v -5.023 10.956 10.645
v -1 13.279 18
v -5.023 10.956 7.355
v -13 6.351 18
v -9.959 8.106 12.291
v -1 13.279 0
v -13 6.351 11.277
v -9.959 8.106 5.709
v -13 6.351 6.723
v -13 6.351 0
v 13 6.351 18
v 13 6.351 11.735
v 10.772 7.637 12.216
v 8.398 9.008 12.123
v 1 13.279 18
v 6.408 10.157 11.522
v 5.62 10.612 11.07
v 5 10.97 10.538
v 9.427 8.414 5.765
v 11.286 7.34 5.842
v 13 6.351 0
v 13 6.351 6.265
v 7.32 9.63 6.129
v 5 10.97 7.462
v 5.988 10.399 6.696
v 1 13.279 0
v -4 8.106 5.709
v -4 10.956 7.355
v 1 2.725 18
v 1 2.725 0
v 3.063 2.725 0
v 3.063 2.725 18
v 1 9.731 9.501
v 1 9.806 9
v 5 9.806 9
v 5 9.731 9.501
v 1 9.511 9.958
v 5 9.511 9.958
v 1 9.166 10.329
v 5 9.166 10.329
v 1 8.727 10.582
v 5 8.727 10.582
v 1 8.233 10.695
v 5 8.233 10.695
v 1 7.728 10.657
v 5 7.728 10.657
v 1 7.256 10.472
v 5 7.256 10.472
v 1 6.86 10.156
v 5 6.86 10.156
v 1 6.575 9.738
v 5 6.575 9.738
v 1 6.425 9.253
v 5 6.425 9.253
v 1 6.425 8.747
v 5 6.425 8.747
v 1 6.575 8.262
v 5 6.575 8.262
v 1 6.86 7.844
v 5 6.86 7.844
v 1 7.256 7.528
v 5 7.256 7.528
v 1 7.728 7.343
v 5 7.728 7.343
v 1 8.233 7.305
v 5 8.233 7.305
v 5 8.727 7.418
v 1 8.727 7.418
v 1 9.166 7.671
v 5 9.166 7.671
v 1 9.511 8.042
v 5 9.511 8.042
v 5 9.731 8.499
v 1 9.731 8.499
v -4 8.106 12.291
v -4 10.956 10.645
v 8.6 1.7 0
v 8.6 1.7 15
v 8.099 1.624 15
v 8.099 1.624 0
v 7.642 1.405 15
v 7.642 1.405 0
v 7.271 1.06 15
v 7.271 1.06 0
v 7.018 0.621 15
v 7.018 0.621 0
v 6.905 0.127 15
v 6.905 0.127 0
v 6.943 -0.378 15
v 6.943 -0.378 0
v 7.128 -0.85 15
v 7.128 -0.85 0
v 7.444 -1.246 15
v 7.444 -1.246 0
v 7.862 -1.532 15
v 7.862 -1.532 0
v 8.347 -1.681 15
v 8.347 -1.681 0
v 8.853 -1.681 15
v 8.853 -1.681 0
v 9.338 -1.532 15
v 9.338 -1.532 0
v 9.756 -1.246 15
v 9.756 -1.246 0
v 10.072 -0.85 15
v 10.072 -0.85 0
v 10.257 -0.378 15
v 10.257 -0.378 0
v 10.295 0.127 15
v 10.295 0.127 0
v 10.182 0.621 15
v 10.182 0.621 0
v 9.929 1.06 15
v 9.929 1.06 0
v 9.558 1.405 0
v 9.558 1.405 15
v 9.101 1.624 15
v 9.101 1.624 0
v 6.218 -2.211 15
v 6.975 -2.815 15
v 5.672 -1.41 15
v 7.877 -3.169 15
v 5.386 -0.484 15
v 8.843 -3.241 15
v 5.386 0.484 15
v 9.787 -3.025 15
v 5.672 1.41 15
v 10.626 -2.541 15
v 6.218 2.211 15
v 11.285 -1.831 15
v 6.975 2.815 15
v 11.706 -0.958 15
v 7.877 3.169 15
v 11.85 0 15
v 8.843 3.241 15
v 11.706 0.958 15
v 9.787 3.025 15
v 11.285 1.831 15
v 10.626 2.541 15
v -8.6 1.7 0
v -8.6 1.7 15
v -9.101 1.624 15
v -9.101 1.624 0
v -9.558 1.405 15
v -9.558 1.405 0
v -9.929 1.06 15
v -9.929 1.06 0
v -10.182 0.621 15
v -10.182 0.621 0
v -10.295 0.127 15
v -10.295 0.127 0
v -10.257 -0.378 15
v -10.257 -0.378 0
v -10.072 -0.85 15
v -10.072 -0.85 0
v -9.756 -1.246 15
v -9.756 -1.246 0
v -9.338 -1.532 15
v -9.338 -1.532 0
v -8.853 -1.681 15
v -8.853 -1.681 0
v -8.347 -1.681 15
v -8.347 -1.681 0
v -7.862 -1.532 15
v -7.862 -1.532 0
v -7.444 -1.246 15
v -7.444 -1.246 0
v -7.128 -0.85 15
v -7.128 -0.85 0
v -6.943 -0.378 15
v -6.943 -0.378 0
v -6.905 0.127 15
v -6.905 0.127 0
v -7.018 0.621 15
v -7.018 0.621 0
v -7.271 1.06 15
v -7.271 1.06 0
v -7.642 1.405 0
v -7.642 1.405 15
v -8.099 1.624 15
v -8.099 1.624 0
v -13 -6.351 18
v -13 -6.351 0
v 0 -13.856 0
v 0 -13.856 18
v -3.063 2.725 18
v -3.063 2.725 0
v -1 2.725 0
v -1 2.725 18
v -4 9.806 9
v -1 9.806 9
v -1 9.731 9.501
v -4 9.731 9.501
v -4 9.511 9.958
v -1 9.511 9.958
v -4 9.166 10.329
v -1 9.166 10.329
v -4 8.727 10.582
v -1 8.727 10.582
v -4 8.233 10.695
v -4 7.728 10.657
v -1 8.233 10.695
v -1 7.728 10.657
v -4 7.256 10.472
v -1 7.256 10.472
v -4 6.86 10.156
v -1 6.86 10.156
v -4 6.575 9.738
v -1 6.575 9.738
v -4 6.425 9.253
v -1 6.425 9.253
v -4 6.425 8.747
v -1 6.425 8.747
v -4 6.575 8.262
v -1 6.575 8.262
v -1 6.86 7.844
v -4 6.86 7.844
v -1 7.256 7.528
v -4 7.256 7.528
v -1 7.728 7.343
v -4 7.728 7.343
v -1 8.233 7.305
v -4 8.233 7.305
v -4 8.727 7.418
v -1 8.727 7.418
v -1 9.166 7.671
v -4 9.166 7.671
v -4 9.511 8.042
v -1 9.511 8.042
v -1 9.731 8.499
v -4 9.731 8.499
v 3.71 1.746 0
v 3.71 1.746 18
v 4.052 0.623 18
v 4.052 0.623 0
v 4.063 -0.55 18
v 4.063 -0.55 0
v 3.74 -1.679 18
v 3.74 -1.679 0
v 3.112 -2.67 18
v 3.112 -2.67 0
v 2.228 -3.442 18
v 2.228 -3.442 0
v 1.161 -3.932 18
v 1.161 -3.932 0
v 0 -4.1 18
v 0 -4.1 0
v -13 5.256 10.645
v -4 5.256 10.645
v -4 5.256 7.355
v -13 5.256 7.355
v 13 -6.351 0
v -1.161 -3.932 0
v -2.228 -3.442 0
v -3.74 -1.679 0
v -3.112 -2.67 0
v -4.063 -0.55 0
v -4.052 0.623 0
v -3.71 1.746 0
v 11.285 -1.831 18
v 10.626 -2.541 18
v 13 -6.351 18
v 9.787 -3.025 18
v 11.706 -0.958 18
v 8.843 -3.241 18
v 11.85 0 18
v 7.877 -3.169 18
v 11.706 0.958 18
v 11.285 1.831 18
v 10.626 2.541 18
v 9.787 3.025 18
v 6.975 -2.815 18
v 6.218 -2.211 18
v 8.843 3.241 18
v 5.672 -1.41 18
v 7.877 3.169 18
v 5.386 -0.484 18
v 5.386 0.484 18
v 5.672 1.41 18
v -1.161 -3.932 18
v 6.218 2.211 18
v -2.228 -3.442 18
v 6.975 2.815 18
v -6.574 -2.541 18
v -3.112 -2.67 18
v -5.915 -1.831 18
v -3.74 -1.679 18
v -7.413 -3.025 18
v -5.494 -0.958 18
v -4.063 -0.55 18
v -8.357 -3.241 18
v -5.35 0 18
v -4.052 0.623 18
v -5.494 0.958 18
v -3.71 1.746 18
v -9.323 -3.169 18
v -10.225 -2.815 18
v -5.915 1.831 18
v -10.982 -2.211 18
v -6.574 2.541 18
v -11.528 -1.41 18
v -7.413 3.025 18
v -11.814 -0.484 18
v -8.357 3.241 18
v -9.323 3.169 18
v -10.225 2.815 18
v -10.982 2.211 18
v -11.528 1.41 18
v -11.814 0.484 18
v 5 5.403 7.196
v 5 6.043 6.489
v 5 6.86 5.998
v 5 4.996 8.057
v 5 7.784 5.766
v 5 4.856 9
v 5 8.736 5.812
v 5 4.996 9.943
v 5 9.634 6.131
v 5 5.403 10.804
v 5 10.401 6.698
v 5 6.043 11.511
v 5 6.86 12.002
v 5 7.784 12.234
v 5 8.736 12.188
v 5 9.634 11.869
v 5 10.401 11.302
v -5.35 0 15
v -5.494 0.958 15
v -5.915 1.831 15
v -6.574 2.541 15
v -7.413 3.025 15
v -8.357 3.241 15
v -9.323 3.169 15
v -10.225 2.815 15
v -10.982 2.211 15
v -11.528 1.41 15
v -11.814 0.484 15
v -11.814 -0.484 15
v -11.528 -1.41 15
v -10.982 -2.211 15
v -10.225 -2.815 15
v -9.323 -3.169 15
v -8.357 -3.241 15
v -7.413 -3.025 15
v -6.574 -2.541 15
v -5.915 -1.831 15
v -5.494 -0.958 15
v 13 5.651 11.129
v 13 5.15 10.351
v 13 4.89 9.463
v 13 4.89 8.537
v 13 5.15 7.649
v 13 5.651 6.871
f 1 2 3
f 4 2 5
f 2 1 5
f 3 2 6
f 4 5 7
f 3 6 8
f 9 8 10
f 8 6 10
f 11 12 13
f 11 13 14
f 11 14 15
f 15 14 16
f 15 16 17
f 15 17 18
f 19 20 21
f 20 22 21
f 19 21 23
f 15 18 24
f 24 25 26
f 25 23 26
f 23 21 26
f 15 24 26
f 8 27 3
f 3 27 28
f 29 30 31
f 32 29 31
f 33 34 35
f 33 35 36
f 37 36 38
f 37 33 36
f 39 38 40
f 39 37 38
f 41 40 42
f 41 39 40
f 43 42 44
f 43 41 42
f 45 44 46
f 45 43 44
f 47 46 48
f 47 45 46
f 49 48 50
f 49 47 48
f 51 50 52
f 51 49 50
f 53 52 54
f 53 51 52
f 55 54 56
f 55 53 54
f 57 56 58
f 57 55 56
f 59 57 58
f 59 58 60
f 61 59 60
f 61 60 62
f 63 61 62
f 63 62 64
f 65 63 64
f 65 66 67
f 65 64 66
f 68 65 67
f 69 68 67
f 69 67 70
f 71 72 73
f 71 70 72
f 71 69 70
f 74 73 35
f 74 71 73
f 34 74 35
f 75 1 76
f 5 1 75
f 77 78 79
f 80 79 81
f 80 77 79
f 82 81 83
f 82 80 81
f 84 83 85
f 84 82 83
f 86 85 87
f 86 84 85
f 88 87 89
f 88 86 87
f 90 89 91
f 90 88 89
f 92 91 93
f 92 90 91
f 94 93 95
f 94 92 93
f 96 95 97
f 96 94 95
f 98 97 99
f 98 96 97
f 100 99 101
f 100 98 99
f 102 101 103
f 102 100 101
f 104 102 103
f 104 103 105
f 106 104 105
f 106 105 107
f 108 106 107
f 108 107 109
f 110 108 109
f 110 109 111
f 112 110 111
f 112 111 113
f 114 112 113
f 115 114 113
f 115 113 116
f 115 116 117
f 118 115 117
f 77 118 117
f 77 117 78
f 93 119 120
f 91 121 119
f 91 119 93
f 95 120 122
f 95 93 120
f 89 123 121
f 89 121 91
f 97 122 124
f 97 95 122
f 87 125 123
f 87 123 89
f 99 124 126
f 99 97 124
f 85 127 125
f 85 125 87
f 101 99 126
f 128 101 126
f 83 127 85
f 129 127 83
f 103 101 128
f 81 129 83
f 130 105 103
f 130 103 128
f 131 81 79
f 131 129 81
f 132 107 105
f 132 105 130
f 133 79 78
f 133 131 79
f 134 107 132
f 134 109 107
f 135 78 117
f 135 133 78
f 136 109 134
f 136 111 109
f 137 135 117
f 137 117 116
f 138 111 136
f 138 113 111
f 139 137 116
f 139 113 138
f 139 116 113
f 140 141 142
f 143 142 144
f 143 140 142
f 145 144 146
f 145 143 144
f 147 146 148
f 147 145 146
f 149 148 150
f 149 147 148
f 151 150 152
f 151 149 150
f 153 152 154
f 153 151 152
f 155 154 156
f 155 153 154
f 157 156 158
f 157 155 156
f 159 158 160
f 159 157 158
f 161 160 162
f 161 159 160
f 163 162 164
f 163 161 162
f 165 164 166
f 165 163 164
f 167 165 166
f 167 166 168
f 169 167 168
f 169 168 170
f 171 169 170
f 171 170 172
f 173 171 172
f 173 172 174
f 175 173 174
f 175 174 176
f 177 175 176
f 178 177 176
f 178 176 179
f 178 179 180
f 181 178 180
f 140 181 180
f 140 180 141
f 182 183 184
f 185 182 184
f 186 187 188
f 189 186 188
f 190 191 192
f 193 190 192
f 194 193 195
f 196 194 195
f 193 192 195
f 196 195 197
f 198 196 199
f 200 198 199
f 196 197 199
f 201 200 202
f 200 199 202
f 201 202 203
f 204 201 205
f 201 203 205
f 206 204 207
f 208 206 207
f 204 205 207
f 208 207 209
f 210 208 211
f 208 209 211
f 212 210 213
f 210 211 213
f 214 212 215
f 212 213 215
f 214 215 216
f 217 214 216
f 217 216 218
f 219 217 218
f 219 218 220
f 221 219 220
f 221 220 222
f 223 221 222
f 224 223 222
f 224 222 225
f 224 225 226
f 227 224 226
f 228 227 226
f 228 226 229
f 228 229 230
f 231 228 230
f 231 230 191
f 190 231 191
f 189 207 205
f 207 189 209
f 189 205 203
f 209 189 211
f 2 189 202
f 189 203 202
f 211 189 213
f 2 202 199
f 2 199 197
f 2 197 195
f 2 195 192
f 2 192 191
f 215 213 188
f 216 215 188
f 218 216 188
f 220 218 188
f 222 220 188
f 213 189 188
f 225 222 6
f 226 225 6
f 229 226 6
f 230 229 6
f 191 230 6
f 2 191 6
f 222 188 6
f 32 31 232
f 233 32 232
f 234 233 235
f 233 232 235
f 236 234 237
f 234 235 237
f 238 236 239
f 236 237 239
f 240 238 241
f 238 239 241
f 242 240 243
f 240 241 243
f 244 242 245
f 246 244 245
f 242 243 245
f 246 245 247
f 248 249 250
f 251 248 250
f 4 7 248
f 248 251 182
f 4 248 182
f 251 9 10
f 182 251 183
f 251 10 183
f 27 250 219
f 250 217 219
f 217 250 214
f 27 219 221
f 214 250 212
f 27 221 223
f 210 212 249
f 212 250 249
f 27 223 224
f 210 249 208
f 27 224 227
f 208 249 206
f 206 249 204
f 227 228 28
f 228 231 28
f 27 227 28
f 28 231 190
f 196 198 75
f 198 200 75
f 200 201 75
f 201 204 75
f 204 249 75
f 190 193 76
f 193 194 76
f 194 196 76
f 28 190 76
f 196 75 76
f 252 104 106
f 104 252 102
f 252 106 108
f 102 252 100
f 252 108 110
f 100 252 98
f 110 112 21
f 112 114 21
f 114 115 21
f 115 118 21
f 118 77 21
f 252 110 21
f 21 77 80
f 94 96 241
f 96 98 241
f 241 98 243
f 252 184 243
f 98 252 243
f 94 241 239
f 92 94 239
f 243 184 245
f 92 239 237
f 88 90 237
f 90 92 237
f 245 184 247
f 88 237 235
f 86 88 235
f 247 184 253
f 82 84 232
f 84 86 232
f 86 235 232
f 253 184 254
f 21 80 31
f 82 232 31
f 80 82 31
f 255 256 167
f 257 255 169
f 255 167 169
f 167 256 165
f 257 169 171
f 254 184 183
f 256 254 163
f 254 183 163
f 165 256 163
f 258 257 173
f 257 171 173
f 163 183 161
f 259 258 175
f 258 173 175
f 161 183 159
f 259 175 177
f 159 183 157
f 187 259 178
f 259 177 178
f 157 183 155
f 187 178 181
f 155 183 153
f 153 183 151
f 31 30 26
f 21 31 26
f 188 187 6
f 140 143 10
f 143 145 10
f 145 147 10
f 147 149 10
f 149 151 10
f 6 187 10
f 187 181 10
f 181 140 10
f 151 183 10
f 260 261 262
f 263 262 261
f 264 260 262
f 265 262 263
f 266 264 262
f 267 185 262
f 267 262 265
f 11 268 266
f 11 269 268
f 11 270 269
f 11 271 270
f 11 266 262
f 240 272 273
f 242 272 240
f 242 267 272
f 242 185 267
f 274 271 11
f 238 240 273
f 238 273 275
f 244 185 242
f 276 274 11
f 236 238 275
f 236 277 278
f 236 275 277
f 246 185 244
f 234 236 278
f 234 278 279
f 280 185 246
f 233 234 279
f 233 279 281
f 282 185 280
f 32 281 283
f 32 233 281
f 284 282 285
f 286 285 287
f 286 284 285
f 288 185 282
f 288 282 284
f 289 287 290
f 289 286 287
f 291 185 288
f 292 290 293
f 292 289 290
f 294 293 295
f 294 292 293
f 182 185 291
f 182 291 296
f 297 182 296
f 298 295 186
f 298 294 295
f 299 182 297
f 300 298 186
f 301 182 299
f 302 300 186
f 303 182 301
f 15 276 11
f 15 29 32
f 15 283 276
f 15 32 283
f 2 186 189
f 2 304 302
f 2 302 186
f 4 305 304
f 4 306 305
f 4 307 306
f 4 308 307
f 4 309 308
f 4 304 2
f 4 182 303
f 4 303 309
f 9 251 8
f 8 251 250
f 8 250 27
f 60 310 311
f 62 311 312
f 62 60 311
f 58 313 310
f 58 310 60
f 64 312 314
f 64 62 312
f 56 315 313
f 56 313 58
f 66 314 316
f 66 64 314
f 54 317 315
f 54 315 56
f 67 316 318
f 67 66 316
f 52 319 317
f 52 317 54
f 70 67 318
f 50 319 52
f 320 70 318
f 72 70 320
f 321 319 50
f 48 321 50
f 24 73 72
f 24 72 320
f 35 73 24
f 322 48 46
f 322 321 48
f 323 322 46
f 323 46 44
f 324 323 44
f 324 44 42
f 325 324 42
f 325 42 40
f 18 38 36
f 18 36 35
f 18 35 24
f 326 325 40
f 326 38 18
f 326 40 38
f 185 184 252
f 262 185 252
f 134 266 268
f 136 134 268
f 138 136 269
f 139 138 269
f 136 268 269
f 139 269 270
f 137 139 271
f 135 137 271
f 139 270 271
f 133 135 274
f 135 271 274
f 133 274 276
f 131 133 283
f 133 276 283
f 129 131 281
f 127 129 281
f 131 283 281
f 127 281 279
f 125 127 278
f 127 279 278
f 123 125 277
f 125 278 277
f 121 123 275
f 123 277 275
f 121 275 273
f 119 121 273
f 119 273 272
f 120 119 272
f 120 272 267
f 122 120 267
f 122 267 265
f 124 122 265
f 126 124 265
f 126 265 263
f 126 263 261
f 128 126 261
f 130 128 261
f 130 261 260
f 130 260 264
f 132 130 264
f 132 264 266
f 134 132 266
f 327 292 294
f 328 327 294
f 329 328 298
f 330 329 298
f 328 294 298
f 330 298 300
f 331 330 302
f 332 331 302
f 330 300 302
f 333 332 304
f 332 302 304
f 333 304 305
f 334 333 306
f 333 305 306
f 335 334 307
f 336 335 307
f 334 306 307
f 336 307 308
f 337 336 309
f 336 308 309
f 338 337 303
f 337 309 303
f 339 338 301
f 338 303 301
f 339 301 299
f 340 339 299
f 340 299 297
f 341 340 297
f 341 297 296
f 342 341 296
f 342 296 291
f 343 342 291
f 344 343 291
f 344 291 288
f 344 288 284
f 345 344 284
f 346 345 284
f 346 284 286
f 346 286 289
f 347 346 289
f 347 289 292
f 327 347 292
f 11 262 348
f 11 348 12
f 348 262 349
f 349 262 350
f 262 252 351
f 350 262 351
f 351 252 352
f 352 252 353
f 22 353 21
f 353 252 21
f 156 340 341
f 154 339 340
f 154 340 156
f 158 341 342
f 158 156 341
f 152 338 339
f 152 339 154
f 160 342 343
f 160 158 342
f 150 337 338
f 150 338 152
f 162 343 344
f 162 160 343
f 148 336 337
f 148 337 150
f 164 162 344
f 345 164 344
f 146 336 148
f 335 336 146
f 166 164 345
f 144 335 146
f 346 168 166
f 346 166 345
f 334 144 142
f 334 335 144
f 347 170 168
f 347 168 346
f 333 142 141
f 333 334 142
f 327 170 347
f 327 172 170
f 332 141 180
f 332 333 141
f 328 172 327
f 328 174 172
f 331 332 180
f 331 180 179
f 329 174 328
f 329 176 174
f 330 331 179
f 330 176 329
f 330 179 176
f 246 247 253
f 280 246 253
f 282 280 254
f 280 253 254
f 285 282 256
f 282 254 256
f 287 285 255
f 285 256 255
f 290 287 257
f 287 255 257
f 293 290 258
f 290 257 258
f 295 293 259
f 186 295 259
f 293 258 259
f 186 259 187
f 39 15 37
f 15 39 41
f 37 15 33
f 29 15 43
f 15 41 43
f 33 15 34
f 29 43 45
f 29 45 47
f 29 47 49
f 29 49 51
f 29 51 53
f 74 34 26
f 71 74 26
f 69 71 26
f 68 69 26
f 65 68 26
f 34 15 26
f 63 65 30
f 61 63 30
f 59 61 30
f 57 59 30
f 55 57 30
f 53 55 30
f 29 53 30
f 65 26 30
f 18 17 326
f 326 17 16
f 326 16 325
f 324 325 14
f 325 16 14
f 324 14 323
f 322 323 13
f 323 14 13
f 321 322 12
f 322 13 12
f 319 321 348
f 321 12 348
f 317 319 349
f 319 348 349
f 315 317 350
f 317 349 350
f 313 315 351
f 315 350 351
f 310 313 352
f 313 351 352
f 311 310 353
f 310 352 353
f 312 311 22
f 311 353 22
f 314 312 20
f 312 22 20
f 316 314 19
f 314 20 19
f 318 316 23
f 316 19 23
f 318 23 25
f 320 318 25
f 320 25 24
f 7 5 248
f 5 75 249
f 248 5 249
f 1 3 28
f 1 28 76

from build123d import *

# Parameters (mm, degrees)
BOSS_EXTRUDE1_DEPTH            = 18
SKETCH41_R                     = 1.7
CUT_EXTRUDE7_DEPTH             = 18
CBORE_FOR_M3_SHCS1_D           = 3.4
CBORE_FOR_M3_SHCS1_CBORE_D     = 6.5
CBORE_FOR_M3_SHCS1_CBORE_DEPTH = 3
CBORE_FOR_M3_SHCS2_D           = 3.4
CBORE_FOR_M3_SHCS2_CBORE_D     = 6.5
CBORE_FOR_M3_SHCS2_CBORE_DEPTH = 3
SKETCH52_R                     = 1.7
CUT_EXTRUDE10_DEPTH            = 15
CUT_EXTRUDE10_DEPTH_BACK       = 15
SKETCH58_R                     = 3.25
CUT_EXTRUDE11_DEPTH            = 8
CUT_EXTRUDE12_DEPTH            = 4
CUT_EXTRUDE12_DEPTH_BACK       = 6


with BuildPart() as part:
    # Sketch1 → Boss-Extrude1 (new body)
    with BuildSketch(Plane(origin=(0, 0, 0), x_dir=(0, 1, 0), z_dir=(0, 0, 1))):
        with BuildLine():
            Line((-6.350852961, -13), (6.350852961, -13))
            Line((6.350852961, -13), (13.279056191, -1))
            Line((13.279056191, -1), (2.724986242, -1))
            Line((2.724986242, -1), (2.724986242, -3.063404965))
            ThreePointArc((2.724986242, -3.063404965), (-1.678921738, -3.740484166), (-4.1, 0))
            ThreePointArc((-4.1, 0), (-1.678921738, 3.740484166), (2.724986242, 3.063404965))
            Line((2.724986242, 3.063404965), (2.724986242, 1))
            Line((2.724986242, 1), (13.279056191, 1))
            Line((13.279056191, 1), (6.350852961, 13))
            Line((6.350852961, 13), (-6.350852961, 13))
            Line((-6.350852961, 13), (-13.856406461, 0))
            Line((-13.856406461, 0), (-6.350852961, -13))
        make_face()
    extrude(amount=BOSS_EXTRUDE1_DEPTH)

    # Sketch41 → Cut-Extrude7 (cut)
    with BuildSketch(Plane(origin=(0, 0, 0), x_dir=(0, 1, 0), z_dir=(0, 0, 1))):
        with Locations((0, 8.6)):
            Circle(SKETCH41_R)
        with Locations((0, -8.6)):
            Circle(SKETCH41_R)
    extrude(amount=CUT_EXTRUDE7_DEPTH, mode=Mode.SUBTRACT)

    # CBORE for M3 SHCS1 (through all)
    with Locations(Plane(origin=(-8.6, 0, 18), x_dir=(1, 0, 0), z_dir=(0, 0, 1))):
        with Locations((0, 0)):
            CounterBoreHole(CBORE_FOR_M3_SHCS1_D / 2, CBORE_FOR_M3_SHCS1_CBORE_D / 2, CBORE_FOR_M3_SHCS1_CBORE_DEPTH)

    # CBORE for M3 SHCS2 (through all)
    with Locations(Plane(origin=(8.6, 0, 18), x_dir=(1, 0, 0), z_dir=(0, 0, 1))):
        with Locations((0, 0)):
            CounterBoreHole(CBORE_FOR_M3_SHCS2_D / 2, CBORE_FOR_M3_SHCS2_CBORE_D / 2, CBORE_FOR_M3_SHCS2_CBORE_DEPTH)

    # Sketch52 → Cut-Extrude10 (cut, two sides)
    with BuildSketch(Plane.YZ.offset(-1)) as cut_extrude10_sk:
        with Locations((8.106406461, 9)):
            Circle(SKETCH52_R)
    extrude(amount=CUT_EXTRUDE10_DEPTH, mode=Mode.SUBTRACT)
    extrude(cut_extrude10_sk.sketch, amount=-CUT_EXTRUDE10_DEPTH_BACK, mode=Mode.SUBTRACT)

    # Sketch58 → Cut-Extrude11 (cut)
    with BuildSketch(Plane.YZ.offset(13)):
        with Locations((8.106406461, 9)):
            Circle(SKETCH58_R)
    extrude(amount=-CUT_EXTRUDE11_DEPTH, mode=Mode.SUBTRACT)

    # Sketch60 → Cut-Extrude12 (cut, two sides)
    with BuildSketch(Plane.YZ.offset(-8)) as cut_extrude12_sk:
        Polygon((8.106406461, 5.709103466), (10.956406461, 7.354551733), (10.956406461, 10.645448267), (8.106406461, 12.290896534), (5.256406461, 10.645448267), (5.256406461, 7.354551733), align=None)
    extrude(amount=CUT_EXTRUDE12_DEPTH, mode=Mode.SUBTRACT)
    extrude(cut_extrude12_sk.sketch, amount=-CUT_EXTRUDE12_DEPTH_BACK, mode=Mode.SUBTRACT)


solid = part.part
